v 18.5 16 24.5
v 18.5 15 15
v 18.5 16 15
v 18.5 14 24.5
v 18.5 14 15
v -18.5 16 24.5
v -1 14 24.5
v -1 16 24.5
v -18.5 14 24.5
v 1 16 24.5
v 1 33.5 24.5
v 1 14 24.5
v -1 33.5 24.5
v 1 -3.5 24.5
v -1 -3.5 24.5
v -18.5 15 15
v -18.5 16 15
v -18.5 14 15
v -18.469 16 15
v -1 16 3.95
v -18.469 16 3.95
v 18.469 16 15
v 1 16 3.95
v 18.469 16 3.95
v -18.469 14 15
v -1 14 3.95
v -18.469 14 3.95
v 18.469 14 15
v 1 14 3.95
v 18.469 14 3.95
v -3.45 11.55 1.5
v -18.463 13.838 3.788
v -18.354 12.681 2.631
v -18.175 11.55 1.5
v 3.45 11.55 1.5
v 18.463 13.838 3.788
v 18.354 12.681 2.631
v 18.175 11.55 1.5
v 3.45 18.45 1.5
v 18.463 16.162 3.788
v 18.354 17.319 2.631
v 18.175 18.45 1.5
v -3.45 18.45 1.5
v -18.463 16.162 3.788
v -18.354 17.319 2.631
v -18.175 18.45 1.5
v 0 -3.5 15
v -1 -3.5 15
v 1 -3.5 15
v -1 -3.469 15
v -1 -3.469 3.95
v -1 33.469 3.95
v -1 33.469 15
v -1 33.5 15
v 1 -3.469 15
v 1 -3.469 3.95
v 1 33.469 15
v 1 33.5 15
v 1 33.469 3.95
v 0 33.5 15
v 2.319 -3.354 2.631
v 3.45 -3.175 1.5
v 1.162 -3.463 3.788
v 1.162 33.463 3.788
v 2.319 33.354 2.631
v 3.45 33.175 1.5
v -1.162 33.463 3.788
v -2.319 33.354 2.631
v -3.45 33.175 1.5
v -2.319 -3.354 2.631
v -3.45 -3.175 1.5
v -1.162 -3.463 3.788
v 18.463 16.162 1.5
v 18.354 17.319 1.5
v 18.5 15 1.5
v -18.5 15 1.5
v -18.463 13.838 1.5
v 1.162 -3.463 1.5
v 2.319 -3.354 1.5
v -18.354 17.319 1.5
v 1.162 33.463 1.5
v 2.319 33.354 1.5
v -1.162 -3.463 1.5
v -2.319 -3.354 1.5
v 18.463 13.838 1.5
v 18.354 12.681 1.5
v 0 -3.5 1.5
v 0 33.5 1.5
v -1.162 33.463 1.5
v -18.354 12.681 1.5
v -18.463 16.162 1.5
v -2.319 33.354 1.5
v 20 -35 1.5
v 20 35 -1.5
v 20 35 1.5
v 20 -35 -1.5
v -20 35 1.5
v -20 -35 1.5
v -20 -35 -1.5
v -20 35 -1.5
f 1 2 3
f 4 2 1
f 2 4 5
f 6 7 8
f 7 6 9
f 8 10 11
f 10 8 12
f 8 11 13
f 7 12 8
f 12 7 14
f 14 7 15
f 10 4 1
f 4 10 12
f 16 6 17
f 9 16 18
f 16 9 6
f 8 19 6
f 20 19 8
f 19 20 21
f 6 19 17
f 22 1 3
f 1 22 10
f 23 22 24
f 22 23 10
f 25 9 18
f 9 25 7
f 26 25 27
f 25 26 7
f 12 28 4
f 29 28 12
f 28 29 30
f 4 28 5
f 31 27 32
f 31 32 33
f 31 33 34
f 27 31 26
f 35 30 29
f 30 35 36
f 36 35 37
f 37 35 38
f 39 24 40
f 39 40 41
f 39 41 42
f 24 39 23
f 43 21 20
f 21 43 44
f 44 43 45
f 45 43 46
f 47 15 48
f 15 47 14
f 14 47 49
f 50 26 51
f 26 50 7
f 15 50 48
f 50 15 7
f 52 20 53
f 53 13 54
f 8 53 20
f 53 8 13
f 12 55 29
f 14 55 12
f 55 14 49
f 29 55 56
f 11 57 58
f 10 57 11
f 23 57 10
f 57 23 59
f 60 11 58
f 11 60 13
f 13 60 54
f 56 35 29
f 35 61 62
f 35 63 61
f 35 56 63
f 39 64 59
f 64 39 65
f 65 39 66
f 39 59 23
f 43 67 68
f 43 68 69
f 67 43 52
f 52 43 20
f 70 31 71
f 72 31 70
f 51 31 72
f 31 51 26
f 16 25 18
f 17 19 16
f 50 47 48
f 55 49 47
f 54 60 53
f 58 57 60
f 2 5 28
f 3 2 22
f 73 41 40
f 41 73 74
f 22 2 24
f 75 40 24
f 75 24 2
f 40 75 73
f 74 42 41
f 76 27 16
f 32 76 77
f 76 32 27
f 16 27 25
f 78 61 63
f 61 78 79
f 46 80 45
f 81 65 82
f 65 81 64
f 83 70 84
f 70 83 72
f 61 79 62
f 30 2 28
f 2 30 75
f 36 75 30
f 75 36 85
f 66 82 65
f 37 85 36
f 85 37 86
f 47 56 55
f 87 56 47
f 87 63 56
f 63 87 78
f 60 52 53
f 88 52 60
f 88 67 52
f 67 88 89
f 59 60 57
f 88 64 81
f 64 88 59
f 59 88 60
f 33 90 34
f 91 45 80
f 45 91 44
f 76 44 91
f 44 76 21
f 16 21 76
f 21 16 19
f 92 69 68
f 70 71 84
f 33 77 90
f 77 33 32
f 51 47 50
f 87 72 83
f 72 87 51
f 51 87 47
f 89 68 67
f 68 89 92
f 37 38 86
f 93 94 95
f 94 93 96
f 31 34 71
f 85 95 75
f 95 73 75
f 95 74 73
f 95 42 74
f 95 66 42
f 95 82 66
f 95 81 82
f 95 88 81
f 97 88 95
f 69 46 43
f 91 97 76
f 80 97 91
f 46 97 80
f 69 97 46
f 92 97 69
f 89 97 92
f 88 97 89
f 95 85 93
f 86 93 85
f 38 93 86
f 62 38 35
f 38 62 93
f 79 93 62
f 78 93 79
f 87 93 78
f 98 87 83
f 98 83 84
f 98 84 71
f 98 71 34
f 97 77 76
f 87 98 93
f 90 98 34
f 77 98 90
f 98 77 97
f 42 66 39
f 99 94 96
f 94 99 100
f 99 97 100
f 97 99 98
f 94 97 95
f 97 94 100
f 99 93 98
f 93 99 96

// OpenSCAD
in_dia = 37;
shift = 15;
height = 25;

// base
cube([40,70,3], center=true);

difference() {
    translate([0,shift,0]) {
        for(i = [0,90,90]) {
            // main supports
            translate([0,0,12]) 
            rotate([0,0,i])
            cube([in_dia,2,25], center=true);
            
            // chamfers for supports
            rotate([45,0,i])
            cube([in_dia, 7, 7], center=true);
        }

    }

    // cut off the bottom
    translate([0,0,-5])
    cube([200,200,10], center=true);

    // cut the outer boundary
    translate([0,shift,0])
    difference() {
        cylinder(d=in_dia+5, h=30, $fn=100,center=true);
        cylinder(d=in_dia, h=31, $fn=100,center=true);
    }

}
